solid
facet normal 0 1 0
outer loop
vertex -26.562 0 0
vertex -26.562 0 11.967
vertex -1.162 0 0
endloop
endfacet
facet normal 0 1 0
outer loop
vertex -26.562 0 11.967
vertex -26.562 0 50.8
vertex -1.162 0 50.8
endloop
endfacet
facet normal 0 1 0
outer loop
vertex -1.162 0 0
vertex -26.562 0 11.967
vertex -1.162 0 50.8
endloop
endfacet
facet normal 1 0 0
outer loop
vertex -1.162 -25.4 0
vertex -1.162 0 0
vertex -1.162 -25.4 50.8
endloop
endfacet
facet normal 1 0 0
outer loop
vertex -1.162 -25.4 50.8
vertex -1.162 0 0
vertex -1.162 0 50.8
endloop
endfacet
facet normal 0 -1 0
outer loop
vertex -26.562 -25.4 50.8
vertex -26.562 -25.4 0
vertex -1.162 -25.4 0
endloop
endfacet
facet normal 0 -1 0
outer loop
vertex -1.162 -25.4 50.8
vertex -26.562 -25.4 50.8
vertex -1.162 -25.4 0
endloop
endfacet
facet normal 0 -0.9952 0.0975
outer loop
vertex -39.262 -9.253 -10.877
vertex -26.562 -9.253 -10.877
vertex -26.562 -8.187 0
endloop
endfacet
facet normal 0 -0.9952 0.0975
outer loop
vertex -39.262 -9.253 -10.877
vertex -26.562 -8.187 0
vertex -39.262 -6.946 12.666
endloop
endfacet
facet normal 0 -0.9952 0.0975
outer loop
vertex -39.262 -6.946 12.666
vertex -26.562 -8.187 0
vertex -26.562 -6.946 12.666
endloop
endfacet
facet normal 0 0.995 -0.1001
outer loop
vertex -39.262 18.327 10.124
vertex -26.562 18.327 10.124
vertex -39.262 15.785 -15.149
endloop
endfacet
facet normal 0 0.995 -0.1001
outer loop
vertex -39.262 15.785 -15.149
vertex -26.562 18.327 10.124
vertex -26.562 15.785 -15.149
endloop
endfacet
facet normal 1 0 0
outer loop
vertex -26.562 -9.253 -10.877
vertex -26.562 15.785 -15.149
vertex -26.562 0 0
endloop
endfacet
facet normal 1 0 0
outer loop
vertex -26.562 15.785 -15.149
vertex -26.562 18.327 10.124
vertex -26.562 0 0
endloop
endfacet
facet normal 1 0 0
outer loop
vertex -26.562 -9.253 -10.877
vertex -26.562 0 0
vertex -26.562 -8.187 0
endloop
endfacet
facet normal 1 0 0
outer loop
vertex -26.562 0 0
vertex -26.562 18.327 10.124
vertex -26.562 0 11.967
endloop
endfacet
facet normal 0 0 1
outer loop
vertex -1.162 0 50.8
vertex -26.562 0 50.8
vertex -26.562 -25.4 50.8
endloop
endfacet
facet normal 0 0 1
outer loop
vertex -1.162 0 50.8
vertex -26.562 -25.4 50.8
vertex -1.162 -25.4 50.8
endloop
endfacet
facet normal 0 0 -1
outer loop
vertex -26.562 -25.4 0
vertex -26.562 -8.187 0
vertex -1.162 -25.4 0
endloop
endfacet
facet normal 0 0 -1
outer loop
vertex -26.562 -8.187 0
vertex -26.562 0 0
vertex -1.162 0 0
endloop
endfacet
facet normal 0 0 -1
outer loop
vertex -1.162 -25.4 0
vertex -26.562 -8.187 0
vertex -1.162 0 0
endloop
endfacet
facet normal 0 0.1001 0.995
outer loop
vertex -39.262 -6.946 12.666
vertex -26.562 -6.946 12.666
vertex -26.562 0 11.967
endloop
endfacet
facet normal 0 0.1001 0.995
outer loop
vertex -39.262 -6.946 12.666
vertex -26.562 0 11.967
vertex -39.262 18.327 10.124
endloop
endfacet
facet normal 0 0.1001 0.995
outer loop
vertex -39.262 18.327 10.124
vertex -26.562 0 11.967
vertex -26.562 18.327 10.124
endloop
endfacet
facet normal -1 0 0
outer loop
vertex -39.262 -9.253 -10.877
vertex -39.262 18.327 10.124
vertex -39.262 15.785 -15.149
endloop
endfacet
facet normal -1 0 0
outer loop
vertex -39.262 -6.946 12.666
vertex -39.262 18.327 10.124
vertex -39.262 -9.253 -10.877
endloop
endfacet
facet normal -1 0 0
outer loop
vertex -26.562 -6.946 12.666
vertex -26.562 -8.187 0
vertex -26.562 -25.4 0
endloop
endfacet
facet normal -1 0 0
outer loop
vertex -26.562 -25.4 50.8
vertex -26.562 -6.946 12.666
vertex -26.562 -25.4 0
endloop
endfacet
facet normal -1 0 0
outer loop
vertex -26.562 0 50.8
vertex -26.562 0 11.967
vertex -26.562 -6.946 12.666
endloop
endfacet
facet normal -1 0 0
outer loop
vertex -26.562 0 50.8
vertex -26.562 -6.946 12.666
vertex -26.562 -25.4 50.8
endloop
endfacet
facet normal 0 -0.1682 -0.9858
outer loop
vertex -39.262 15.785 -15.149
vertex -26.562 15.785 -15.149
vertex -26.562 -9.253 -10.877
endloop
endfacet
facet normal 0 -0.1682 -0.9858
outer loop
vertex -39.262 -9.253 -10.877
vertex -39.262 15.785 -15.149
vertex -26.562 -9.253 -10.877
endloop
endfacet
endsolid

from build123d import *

# Parameters (mm, degrees)
F0_W     = 25.4
F0_H     = 50.8
F1_DEPTH = 25.4
F3_DEPTH = 12.7


with BuildPart() as f1:
    # F0 (on Front) → F1 (new body)
    with BuildSketch(Plane.XZ):
        with Locations((-13.86246, 25.4)):
            Rectangle(F0_W, F0_H)
    extrude(amount=F1_DEPTH)

    # F2 (on face) → F3 (join)
    with BuildSketch(Plane(origin=(-26.56246, 0, 0), x_dir=(0, -1, 0), z_dir=(-1, 0, 0))):
        Polygon((9.253424, -10.877157), (6.945989, 12.665603), (-18.326523, 10.123924), (-15.784844, -15.148588), align=None)
    extrude(amount=F3_DEPTH)


solid = f1.part
